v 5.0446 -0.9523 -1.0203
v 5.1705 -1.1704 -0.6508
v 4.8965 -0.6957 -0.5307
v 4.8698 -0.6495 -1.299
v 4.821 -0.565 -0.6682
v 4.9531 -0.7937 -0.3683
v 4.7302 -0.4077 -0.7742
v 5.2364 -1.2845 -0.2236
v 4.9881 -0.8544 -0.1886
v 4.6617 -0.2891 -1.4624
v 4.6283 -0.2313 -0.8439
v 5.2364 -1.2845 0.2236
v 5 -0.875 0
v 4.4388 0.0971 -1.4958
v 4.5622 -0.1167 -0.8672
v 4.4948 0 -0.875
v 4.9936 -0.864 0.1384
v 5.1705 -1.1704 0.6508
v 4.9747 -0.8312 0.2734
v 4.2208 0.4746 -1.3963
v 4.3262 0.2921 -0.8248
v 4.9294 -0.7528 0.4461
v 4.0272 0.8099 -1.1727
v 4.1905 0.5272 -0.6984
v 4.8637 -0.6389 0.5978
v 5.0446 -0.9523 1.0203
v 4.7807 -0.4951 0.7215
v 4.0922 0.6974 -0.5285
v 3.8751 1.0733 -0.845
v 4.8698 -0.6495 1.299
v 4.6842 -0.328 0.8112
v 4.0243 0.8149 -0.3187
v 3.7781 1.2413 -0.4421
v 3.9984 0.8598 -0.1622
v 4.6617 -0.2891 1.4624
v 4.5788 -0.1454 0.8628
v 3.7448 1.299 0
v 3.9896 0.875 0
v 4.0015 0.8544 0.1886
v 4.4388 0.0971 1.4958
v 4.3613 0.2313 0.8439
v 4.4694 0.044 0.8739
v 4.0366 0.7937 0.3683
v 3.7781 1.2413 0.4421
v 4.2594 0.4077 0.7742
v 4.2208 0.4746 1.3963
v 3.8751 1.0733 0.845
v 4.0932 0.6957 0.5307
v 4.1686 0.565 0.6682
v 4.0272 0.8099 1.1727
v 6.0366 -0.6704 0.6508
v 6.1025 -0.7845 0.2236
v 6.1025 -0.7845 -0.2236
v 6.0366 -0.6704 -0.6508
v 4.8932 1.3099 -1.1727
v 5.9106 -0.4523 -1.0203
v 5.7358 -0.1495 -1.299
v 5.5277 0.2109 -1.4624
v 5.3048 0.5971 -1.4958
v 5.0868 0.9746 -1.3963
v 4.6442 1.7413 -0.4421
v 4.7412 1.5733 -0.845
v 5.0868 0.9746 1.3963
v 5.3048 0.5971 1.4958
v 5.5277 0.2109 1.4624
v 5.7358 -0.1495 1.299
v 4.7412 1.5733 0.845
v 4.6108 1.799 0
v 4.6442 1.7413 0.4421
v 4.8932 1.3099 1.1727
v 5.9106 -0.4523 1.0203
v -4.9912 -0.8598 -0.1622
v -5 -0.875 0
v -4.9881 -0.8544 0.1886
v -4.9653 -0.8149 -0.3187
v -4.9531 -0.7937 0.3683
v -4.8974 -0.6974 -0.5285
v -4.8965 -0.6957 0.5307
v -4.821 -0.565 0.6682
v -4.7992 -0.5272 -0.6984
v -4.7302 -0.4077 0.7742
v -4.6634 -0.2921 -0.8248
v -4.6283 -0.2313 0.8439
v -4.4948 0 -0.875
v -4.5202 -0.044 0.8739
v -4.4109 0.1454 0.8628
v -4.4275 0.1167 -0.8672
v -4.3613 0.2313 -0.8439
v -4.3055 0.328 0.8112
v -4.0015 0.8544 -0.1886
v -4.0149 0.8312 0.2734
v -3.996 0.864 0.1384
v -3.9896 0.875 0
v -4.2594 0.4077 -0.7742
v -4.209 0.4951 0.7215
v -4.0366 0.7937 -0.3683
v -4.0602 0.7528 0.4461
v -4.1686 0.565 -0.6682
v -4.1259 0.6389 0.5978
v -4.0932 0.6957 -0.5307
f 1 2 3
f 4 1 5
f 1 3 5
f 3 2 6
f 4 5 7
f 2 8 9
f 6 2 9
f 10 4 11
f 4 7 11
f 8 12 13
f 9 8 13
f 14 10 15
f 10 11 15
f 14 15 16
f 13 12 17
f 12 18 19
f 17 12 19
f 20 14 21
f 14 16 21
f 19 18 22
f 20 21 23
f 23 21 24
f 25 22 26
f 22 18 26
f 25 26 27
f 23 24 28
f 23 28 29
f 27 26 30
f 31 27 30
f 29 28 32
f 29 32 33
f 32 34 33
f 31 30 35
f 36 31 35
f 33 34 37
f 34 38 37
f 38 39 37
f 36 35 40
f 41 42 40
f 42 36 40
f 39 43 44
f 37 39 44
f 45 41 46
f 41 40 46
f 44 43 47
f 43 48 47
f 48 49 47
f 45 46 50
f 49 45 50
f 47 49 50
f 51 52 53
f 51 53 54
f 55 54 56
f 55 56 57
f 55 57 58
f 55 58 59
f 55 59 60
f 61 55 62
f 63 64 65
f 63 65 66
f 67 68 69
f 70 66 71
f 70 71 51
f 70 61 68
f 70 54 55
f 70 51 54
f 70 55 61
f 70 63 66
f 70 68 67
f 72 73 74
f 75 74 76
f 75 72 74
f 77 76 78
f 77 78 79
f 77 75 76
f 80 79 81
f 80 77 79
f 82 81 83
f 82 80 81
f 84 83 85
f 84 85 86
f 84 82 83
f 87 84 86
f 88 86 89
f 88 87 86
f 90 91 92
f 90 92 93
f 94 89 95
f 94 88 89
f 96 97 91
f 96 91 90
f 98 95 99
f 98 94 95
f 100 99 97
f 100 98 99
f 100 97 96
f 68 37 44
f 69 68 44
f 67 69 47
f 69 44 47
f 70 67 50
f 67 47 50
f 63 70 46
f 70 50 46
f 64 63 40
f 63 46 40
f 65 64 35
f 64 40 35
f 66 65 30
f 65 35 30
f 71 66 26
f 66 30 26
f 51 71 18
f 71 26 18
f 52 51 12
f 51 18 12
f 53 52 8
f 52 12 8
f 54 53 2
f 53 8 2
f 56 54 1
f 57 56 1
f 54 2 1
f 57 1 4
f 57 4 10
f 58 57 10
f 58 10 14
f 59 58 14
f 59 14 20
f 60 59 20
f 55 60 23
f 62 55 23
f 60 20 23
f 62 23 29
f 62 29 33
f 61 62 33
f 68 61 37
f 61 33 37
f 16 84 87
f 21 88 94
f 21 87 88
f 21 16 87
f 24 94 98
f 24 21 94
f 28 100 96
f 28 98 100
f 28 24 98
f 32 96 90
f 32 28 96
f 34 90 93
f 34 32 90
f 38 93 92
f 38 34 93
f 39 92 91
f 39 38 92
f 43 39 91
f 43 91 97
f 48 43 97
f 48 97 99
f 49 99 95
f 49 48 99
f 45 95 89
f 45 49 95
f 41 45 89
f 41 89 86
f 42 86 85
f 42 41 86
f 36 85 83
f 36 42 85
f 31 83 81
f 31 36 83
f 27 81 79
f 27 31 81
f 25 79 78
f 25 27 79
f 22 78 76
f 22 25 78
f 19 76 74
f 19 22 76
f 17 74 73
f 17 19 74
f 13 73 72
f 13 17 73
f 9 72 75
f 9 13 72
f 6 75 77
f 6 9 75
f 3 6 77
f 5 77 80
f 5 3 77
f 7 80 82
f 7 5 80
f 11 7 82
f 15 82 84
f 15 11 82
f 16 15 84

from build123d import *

# Parameters (mm, degrees)
SKETCH1_R               = 0.875
BOSS_EXTRUDE1_DEPTH     = 5
CUT_EXTRUDE1_DEPTH      = 6.150849445
CUT_EXTRUDE1_DEPTH_BACK = 6.150849445
SKETCH3_R               = 1.5
BOSS_EXTRUDE2_DEPTH     = 1


with BuildPart() as part:
    # Sketch1 → Boss-Extrude1 (new, symmetric)
    with BuildSketch(Plane(origin=(0, 0, 0), x_dir=(0, 0, -1), z_dir=(1, 0, 0))):
        Circle(SKETCH1_R)
    extrude(amount=BOSS_EXTRUDE1_DEPTH, both=True)

    # Sketch2 → Cut-Extrude1 (cut, two sides: drawn at the far end of the back side and taken through both)
    with BuildSketch(Plane.XY.offset(-CUT_EXTRUDE1_DEPTH_BACK)):
        Polygon((-5, 0.875), (-5, -0.875), (-3.989637029, 0.875), align=None)
        Polygon((5, 0.875), (3.989637029, 0.875), (5, -0.875), align=None)
    extrude(amount=CUT_EXTRUDE1_DEPTH + CUT_EXTRUDE1_DEPTH_BACK, mode=Mode.SUBTRACT)

    # Sketch3 → Boss-Extrude2 (add)
    with BuildSketch(Plane(origin=(3.371113886, 1.946313509, 0), x_dir=(0, 0, -1), z_dir=(0.866025403784438, 0.5000000000000012, 0))):
        with Locations(Location((0, -2.247409257, 0), (0, 0, 90))):
            Circle(SKETCH3_R)
    extrude(amount=BOSS_EXTRUDE2_DEPTH)


solid = part.part
